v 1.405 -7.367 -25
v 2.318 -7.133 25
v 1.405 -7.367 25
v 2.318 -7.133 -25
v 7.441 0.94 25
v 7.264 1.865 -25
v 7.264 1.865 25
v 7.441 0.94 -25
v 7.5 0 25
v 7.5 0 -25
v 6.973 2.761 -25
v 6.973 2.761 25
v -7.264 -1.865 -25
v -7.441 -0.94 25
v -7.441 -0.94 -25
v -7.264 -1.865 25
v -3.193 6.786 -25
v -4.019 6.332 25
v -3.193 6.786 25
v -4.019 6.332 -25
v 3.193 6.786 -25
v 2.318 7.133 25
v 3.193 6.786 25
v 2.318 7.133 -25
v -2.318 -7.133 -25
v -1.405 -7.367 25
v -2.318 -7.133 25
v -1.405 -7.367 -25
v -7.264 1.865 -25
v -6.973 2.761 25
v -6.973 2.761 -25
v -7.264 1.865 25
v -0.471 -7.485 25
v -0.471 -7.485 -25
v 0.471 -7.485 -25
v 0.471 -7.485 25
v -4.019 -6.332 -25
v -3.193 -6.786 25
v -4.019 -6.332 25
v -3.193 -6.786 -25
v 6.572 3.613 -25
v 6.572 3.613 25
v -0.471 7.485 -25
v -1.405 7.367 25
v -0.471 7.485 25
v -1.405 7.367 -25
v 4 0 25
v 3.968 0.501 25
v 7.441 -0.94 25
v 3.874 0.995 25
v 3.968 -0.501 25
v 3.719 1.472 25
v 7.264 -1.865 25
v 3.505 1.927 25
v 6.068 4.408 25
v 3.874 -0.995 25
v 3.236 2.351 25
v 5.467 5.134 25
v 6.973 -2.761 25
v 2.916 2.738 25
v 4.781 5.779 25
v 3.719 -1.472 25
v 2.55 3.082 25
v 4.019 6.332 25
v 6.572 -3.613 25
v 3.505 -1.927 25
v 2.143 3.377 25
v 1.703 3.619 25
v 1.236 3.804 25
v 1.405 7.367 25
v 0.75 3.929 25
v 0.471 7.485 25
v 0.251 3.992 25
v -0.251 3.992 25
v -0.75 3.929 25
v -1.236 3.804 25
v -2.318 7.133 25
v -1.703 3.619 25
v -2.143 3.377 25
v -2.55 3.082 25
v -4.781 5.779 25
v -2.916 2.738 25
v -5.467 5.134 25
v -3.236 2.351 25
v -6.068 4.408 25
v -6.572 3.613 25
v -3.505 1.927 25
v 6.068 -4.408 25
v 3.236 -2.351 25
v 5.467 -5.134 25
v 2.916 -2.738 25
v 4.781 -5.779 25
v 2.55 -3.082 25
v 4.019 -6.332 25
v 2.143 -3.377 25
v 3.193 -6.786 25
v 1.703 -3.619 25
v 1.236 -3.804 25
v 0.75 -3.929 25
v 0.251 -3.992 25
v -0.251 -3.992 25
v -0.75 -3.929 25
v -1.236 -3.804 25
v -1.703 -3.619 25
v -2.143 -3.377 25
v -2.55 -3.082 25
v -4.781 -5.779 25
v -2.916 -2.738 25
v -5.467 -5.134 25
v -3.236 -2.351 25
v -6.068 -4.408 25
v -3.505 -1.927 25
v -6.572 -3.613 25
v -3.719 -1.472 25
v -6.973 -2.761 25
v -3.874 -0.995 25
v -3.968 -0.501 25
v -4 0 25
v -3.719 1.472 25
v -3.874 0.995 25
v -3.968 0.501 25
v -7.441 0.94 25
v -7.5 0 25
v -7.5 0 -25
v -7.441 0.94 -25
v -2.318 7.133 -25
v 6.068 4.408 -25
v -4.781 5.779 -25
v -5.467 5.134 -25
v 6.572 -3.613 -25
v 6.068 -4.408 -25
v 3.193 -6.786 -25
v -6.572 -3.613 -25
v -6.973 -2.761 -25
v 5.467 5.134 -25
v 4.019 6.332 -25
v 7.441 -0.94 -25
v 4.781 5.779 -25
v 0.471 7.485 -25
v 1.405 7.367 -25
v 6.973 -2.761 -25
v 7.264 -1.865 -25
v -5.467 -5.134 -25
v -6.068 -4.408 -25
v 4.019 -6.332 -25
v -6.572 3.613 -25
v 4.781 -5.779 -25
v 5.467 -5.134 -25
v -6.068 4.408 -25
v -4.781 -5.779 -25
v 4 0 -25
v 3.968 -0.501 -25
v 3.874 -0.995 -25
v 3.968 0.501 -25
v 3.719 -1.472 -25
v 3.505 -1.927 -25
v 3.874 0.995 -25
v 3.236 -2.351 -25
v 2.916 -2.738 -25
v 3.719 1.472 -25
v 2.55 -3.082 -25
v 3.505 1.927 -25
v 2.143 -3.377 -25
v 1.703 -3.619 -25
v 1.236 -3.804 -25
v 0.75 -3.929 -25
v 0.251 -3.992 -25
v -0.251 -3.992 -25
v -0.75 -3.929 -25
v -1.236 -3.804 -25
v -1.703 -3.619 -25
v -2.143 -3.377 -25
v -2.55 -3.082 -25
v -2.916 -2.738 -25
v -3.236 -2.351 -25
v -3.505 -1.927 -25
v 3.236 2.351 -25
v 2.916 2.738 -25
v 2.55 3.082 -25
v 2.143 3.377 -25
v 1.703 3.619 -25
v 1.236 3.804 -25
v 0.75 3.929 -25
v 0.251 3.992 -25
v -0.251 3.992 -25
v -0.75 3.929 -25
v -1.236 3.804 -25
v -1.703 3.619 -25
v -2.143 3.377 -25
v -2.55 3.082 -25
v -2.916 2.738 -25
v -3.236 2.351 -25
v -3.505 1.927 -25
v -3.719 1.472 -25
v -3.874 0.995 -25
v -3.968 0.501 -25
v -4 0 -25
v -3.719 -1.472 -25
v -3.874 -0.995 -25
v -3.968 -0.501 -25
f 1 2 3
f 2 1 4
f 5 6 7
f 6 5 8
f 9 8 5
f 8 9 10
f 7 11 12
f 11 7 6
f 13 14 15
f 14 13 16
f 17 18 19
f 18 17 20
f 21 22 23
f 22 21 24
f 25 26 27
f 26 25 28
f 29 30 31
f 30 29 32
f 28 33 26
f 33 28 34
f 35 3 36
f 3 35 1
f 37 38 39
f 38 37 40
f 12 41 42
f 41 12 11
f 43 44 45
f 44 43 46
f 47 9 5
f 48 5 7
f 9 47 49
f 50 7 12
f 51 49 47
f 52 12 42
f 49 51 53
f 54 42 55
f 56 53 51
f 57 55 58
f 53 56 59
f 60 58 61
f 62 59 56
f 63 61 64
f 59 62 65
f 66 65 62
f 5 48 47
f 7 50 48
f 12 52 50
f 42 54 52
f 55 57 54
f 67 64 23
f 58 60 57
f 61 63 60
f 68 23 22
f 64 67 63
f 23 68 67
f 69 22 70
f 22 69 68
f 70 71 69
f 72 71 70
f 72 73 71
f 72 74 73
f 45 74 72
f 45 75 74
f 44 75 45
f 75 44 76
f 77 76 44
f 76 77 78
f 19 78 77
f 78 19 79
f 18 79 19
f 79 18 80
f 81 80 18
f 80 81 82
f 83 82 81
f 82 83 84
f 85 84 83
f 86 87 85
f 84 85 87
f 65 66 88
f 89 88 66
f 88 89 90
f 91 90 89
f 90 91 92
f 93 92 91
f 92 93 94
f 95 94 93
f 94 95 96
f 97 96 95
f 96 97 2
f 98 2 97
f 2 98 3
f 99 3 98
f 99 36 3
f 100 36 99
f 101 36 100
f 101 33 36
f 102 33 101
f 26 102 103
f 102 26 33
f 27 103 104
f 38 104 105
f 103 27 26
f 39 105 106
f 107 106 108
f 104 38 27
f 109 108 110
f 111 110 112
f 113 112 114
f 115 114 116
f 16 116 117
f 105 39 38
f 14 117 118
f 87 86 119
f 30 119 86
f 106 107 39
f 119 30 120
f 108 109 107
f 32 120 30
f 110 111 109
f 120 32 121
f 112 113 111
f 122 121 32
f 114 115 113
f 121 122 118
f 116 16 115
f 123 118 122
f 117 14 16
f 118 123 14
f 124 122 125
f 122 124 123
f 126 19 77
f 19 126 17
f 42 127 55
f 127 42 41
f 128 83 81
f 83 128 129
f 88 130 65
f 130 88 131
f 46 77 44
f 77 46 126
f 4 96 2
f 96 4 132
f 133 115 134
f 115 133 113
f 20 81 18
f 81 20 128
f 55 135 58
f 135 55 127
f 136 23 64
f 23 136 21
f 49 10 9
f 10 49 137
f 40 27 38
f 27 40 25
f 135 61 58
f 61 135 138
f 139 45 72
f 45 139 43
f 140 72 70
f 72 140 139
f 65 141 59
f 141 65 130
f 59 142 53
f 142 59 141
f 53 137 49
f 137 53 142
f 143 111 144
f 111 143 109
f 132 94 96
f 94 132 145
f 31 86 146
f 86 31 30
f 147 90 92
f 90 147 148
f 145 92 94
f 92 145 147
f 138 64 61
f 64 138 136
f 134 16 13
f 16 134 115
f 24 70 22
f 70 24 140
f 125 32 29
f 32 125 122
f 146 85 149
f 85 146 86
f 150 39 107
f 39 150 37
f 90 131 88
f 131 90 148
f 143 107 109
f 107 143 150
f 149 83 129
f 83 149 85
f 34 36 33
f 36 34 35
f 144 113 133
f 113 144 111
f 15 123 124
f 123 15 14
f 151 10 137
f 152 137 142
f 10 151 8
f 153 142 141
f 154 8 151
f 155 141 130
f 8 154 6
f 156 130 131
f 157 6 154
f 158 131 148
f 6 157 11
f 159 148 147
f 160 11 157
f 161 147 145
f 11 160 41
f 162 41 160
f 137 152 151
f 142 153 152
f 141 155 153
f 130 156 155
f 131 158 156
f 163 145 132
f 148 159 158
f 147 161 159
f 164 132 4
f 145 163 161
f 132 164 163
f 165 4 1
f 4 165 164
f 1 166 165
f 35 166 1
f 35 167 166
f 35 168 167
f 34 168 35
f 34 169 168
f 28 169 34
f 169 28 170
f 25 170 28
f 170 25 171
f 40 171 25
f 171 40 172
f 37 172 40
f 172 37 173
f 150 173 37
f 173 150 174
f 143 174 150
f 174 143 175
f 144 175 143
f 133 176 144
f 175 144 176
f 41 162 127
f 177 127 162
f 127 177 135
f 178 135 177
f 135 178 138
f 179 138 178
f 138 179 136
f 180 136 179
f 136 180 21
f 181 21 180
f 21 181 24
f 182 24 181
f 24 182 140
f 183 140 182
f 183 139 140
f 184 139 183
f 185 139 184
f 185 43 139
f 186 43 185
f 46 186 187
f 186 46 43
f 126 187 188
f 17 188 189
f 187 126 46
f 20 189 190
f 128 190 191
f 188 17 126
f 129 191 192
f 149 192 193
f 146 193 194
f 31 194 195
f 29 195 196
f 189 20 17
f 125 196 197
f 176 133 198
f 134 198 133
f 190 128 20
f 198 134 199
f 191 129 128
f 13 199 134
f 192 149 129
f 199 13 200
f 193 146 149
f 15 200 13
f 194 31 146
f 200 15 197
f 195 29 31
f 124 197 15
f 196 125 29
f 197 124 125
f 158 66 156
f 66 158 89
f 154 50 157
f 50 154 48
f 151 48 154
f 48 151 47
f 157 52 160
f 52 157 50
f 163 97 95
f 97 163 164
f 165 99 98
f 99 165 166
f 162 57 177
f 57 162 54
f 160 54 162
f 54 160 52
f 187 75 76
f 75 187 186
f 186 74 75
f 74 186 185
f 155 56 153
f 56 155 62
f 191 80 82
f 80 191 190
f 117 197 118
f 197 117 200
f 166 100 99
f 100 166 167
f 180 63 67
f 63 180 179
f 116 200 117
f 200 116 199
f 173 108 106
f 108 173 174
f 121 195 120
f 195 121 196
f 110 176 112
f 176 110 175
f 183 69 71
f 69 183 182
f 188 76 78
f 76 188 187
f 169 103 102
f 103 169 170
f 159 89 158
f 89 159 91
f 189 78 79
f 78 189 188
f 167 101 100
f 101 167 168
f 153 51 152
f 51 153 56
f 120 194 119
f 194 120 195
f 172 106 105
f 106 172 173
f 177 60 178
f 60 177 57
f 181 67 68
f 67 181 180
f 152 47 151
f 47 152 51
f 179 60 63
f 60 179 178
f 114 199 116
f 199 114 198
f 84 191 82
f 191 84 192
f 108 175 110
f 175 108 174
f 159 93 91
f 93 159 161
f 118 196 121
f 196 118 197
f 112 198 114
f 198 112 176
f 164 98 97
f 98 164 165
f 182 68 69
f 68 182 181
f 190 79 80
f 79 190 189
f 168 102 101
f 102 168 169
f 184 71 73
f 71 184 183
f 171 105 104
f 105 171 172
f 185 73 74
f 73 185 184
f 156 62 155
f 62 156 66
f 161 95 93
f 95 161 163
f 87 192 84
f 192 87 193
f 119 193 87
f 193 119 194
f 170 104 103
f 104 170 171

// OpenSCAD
$fn = 50;


difference() {
	union() {
		translate(v = [0, 0, -25.0000000000]) {
			cylinder(h = 50, r = 7.5000000000);
		}
	}
	union() {
		translate(v = [0, 0, -100.0000000000]) {
			cylinder(h = 200, r = 4.0000000000);
		}
	}
}
